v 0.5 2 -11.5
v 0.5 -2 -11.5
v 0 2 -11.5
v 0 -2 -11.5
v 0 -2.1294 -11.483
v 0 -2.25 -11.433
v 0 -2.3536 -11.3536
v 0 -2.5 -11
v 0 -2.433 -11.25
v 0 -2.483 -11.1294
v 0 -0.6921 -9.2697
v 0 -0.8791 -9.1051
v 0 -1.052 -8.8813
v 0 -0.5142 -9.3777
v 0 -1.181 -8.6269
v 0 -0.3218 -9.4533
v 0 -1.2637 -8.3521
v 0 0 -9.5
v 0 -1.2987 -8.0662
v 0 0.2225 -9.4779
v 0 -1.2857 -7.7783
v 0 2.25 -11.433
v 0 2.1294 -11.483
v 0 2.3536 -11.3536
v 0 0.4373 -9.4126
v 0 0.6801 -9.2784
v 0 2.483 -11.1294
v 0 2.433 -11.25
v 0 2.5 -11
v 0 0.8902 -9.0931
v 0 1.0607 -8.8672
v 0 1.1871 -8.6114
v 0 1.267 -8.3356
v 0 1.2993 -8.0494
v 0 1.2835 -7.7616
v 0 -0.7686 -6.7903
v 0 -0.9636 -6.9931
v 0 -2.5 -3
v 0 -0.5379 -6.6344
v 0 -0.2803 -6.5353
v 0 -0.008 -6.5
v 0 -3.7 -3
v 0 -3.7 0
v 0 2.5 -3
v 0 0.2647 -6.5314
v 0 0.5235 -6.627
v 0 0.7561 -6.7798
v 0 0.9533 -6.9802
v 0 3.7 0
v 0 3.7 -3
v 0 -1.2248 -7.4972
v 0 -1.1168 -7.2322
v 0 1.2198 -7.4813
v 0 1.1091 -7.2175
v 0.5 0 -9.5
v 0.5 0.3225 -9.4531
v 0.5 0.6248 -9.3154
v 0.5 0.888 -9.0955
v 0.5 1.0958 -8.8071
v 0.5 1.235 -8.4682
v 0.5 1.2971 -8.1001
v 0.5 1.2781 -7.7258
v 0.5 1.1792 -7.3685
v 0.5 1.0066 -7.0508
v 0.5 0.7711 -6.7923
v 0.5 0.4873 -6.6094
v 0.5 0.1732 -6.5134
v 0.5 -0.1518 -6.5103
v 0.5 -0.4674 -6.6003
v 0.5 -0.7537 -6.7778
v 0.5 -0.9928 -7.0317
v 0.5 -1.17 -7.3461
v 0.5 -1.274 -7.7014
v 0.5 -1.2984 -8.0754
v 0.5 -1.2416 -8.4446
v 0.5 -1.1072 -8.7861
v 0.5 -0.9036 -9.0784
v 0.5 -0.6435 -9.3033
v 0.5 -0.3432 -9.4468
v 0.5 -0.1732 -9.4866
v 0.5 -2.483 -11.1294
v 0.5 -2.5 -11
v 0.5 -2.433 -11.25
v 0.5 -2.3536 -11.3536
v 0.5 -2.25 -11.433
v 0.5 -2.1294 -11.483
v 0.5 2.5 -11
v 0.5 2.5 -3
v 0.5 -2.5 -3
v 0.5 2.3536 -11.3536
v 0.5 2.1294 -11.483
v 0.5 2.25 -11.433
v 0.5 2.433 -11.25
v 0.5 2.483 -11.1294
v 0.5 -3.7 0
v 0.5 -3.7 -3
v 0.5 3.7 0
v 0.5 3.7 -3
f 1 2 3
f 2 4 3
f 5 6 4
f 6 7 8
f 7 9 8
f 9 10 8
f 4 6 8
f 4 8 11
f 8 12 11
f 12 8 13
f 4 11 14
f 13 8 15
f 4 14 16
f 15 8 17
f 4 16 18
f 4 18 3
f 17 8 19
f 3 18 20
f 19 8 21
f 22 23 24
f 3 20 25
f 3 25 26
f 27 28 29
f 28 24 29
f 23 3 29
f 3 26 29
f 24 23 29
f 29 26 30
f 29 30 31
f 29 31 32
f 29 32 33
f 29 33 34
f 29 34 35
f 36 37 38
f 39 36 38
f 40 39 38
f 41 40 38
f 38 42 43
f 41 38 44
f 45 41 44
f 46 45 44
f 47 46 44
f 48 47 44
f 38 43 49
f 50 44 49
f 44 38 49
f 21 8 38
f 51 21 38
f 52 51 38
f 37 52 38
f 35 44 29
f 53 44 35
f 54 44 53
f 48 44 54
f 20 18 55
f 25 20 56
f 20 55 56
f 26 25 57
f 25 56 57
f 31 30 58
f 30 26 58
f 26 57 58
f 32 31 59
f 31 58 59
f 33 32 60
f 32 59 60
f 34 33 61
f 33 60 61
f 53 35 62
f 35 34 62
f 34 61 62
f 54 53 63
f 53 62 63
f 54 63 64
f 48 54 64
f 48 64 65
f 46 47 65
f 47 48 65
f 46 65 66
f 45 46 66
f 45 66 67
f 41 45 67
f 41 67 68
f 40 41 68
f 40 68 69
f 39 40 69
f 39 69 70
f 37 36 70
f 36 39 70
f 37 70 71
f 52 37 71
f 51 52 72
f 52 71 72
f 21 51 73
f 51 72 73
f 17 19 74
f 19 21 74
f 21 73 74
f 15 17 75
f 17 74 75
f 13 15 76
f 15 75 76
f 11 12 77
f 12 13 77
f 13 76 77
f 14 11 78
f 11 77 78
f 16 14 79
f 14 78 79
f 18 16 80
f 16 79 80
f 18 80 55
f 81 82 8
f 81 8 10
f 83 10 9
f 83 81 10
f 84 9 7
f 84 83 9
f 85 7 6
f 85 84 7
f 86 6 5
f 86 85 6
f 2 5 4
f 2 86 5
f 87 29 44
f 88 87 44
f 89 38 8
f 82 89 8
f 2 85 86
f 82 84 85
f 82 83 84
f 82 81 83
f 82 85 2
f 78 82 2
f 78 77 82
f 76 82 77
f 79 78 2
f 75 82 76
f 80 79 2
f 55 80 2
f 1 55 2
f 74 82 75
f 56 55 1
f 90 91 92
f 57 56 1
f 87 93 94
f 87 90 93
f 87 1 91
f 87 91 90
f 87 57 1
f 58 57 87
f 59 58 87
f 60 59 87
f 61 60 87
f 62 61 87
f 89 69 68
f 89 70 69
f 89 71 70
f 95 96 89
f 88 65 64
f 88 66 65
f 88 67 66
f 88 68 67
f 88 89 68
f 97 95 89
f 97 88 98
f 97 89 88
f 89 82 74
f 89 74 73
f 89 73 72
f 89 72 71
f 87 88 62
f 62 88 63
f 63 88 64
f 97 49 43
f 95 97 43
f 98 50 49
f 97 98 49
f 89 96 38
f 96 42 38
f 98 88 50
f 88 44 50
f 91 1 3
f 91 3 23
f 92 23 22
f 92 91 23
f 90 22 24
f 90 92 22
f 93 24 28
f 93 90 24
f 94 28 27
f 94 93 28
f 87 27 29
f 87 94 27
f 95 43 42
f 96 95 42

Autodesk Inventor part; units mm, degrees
ref_plane "YZ Plane" through (0, 0, 0) normal (1, 0, 0) x (0, 1, 0)
ref_plane "XZ Plane" through (0, 0, 0) normal (0, 1, 0) x (-1, 0, 0)
ref_plane "XY Plane" through (0, 0, 0) normal (0, 0, 1) x (1, 0, 0)
sketch "スケッチ1" plane through (0, 0, 0) normal (1, 0, 0) x (0, 1, 0)
  line L0 (3.7, 0) -> (-3.7, 0)
  line L1 (-3.7, 0) -> (-3.7, -3)
  line L2 (-3.7, -3) -> (3.7, -3)
  line L3 (3.7, -3) -> (3.7, 0)
  line L4 (2.5, -3) -> (-2.5, -3)
  line L5 (-2.5, -3) -> (-2.5, -11.5)
  line L6 (-2.5, -11.5) -> (2.5, -11.5)
  line L7 (2.5, -11.5) -> (2.5, -3)
  point P0 (0, 0)
  point P1 (0, 0)
  point P2 (0, -3)
  dimension "d0" = 7.4
  dimension "d1" = 3
  dimension "d2" = 5
  dimension "d3" = 8.5
extrude "押し出し1" add sketch "スケッチ1" along normal blind 0.5
sketch "スケッチ2" plane through (0.5, 0, 0) normal (1, 0, 0) x (0, 0, -1)
  ellipse E0 centre (8, 0) end of major axis (9.5, 0) minor radius 1.3
  line L0 (0, 3.7) -> (0, -3.7) projected
  line L1 (11.5, -2.5) -> (11.5, 2.5) projected
  point P0 (0, 0)
  point P1 (0, 0)
  dimension "d6" = 1.3
  dimension "d7" = 1.5
  dimension "d8" = 3.5
extrude "押し出し2" cut sketch "スケッチ2" against normal through all
fillet "フィレット1" radius 0.5 2 edges at (0.25, -2.5, -11.5) (0.25, 2.5, -11.5)
properties part number "555_Terminal" material "銅"
